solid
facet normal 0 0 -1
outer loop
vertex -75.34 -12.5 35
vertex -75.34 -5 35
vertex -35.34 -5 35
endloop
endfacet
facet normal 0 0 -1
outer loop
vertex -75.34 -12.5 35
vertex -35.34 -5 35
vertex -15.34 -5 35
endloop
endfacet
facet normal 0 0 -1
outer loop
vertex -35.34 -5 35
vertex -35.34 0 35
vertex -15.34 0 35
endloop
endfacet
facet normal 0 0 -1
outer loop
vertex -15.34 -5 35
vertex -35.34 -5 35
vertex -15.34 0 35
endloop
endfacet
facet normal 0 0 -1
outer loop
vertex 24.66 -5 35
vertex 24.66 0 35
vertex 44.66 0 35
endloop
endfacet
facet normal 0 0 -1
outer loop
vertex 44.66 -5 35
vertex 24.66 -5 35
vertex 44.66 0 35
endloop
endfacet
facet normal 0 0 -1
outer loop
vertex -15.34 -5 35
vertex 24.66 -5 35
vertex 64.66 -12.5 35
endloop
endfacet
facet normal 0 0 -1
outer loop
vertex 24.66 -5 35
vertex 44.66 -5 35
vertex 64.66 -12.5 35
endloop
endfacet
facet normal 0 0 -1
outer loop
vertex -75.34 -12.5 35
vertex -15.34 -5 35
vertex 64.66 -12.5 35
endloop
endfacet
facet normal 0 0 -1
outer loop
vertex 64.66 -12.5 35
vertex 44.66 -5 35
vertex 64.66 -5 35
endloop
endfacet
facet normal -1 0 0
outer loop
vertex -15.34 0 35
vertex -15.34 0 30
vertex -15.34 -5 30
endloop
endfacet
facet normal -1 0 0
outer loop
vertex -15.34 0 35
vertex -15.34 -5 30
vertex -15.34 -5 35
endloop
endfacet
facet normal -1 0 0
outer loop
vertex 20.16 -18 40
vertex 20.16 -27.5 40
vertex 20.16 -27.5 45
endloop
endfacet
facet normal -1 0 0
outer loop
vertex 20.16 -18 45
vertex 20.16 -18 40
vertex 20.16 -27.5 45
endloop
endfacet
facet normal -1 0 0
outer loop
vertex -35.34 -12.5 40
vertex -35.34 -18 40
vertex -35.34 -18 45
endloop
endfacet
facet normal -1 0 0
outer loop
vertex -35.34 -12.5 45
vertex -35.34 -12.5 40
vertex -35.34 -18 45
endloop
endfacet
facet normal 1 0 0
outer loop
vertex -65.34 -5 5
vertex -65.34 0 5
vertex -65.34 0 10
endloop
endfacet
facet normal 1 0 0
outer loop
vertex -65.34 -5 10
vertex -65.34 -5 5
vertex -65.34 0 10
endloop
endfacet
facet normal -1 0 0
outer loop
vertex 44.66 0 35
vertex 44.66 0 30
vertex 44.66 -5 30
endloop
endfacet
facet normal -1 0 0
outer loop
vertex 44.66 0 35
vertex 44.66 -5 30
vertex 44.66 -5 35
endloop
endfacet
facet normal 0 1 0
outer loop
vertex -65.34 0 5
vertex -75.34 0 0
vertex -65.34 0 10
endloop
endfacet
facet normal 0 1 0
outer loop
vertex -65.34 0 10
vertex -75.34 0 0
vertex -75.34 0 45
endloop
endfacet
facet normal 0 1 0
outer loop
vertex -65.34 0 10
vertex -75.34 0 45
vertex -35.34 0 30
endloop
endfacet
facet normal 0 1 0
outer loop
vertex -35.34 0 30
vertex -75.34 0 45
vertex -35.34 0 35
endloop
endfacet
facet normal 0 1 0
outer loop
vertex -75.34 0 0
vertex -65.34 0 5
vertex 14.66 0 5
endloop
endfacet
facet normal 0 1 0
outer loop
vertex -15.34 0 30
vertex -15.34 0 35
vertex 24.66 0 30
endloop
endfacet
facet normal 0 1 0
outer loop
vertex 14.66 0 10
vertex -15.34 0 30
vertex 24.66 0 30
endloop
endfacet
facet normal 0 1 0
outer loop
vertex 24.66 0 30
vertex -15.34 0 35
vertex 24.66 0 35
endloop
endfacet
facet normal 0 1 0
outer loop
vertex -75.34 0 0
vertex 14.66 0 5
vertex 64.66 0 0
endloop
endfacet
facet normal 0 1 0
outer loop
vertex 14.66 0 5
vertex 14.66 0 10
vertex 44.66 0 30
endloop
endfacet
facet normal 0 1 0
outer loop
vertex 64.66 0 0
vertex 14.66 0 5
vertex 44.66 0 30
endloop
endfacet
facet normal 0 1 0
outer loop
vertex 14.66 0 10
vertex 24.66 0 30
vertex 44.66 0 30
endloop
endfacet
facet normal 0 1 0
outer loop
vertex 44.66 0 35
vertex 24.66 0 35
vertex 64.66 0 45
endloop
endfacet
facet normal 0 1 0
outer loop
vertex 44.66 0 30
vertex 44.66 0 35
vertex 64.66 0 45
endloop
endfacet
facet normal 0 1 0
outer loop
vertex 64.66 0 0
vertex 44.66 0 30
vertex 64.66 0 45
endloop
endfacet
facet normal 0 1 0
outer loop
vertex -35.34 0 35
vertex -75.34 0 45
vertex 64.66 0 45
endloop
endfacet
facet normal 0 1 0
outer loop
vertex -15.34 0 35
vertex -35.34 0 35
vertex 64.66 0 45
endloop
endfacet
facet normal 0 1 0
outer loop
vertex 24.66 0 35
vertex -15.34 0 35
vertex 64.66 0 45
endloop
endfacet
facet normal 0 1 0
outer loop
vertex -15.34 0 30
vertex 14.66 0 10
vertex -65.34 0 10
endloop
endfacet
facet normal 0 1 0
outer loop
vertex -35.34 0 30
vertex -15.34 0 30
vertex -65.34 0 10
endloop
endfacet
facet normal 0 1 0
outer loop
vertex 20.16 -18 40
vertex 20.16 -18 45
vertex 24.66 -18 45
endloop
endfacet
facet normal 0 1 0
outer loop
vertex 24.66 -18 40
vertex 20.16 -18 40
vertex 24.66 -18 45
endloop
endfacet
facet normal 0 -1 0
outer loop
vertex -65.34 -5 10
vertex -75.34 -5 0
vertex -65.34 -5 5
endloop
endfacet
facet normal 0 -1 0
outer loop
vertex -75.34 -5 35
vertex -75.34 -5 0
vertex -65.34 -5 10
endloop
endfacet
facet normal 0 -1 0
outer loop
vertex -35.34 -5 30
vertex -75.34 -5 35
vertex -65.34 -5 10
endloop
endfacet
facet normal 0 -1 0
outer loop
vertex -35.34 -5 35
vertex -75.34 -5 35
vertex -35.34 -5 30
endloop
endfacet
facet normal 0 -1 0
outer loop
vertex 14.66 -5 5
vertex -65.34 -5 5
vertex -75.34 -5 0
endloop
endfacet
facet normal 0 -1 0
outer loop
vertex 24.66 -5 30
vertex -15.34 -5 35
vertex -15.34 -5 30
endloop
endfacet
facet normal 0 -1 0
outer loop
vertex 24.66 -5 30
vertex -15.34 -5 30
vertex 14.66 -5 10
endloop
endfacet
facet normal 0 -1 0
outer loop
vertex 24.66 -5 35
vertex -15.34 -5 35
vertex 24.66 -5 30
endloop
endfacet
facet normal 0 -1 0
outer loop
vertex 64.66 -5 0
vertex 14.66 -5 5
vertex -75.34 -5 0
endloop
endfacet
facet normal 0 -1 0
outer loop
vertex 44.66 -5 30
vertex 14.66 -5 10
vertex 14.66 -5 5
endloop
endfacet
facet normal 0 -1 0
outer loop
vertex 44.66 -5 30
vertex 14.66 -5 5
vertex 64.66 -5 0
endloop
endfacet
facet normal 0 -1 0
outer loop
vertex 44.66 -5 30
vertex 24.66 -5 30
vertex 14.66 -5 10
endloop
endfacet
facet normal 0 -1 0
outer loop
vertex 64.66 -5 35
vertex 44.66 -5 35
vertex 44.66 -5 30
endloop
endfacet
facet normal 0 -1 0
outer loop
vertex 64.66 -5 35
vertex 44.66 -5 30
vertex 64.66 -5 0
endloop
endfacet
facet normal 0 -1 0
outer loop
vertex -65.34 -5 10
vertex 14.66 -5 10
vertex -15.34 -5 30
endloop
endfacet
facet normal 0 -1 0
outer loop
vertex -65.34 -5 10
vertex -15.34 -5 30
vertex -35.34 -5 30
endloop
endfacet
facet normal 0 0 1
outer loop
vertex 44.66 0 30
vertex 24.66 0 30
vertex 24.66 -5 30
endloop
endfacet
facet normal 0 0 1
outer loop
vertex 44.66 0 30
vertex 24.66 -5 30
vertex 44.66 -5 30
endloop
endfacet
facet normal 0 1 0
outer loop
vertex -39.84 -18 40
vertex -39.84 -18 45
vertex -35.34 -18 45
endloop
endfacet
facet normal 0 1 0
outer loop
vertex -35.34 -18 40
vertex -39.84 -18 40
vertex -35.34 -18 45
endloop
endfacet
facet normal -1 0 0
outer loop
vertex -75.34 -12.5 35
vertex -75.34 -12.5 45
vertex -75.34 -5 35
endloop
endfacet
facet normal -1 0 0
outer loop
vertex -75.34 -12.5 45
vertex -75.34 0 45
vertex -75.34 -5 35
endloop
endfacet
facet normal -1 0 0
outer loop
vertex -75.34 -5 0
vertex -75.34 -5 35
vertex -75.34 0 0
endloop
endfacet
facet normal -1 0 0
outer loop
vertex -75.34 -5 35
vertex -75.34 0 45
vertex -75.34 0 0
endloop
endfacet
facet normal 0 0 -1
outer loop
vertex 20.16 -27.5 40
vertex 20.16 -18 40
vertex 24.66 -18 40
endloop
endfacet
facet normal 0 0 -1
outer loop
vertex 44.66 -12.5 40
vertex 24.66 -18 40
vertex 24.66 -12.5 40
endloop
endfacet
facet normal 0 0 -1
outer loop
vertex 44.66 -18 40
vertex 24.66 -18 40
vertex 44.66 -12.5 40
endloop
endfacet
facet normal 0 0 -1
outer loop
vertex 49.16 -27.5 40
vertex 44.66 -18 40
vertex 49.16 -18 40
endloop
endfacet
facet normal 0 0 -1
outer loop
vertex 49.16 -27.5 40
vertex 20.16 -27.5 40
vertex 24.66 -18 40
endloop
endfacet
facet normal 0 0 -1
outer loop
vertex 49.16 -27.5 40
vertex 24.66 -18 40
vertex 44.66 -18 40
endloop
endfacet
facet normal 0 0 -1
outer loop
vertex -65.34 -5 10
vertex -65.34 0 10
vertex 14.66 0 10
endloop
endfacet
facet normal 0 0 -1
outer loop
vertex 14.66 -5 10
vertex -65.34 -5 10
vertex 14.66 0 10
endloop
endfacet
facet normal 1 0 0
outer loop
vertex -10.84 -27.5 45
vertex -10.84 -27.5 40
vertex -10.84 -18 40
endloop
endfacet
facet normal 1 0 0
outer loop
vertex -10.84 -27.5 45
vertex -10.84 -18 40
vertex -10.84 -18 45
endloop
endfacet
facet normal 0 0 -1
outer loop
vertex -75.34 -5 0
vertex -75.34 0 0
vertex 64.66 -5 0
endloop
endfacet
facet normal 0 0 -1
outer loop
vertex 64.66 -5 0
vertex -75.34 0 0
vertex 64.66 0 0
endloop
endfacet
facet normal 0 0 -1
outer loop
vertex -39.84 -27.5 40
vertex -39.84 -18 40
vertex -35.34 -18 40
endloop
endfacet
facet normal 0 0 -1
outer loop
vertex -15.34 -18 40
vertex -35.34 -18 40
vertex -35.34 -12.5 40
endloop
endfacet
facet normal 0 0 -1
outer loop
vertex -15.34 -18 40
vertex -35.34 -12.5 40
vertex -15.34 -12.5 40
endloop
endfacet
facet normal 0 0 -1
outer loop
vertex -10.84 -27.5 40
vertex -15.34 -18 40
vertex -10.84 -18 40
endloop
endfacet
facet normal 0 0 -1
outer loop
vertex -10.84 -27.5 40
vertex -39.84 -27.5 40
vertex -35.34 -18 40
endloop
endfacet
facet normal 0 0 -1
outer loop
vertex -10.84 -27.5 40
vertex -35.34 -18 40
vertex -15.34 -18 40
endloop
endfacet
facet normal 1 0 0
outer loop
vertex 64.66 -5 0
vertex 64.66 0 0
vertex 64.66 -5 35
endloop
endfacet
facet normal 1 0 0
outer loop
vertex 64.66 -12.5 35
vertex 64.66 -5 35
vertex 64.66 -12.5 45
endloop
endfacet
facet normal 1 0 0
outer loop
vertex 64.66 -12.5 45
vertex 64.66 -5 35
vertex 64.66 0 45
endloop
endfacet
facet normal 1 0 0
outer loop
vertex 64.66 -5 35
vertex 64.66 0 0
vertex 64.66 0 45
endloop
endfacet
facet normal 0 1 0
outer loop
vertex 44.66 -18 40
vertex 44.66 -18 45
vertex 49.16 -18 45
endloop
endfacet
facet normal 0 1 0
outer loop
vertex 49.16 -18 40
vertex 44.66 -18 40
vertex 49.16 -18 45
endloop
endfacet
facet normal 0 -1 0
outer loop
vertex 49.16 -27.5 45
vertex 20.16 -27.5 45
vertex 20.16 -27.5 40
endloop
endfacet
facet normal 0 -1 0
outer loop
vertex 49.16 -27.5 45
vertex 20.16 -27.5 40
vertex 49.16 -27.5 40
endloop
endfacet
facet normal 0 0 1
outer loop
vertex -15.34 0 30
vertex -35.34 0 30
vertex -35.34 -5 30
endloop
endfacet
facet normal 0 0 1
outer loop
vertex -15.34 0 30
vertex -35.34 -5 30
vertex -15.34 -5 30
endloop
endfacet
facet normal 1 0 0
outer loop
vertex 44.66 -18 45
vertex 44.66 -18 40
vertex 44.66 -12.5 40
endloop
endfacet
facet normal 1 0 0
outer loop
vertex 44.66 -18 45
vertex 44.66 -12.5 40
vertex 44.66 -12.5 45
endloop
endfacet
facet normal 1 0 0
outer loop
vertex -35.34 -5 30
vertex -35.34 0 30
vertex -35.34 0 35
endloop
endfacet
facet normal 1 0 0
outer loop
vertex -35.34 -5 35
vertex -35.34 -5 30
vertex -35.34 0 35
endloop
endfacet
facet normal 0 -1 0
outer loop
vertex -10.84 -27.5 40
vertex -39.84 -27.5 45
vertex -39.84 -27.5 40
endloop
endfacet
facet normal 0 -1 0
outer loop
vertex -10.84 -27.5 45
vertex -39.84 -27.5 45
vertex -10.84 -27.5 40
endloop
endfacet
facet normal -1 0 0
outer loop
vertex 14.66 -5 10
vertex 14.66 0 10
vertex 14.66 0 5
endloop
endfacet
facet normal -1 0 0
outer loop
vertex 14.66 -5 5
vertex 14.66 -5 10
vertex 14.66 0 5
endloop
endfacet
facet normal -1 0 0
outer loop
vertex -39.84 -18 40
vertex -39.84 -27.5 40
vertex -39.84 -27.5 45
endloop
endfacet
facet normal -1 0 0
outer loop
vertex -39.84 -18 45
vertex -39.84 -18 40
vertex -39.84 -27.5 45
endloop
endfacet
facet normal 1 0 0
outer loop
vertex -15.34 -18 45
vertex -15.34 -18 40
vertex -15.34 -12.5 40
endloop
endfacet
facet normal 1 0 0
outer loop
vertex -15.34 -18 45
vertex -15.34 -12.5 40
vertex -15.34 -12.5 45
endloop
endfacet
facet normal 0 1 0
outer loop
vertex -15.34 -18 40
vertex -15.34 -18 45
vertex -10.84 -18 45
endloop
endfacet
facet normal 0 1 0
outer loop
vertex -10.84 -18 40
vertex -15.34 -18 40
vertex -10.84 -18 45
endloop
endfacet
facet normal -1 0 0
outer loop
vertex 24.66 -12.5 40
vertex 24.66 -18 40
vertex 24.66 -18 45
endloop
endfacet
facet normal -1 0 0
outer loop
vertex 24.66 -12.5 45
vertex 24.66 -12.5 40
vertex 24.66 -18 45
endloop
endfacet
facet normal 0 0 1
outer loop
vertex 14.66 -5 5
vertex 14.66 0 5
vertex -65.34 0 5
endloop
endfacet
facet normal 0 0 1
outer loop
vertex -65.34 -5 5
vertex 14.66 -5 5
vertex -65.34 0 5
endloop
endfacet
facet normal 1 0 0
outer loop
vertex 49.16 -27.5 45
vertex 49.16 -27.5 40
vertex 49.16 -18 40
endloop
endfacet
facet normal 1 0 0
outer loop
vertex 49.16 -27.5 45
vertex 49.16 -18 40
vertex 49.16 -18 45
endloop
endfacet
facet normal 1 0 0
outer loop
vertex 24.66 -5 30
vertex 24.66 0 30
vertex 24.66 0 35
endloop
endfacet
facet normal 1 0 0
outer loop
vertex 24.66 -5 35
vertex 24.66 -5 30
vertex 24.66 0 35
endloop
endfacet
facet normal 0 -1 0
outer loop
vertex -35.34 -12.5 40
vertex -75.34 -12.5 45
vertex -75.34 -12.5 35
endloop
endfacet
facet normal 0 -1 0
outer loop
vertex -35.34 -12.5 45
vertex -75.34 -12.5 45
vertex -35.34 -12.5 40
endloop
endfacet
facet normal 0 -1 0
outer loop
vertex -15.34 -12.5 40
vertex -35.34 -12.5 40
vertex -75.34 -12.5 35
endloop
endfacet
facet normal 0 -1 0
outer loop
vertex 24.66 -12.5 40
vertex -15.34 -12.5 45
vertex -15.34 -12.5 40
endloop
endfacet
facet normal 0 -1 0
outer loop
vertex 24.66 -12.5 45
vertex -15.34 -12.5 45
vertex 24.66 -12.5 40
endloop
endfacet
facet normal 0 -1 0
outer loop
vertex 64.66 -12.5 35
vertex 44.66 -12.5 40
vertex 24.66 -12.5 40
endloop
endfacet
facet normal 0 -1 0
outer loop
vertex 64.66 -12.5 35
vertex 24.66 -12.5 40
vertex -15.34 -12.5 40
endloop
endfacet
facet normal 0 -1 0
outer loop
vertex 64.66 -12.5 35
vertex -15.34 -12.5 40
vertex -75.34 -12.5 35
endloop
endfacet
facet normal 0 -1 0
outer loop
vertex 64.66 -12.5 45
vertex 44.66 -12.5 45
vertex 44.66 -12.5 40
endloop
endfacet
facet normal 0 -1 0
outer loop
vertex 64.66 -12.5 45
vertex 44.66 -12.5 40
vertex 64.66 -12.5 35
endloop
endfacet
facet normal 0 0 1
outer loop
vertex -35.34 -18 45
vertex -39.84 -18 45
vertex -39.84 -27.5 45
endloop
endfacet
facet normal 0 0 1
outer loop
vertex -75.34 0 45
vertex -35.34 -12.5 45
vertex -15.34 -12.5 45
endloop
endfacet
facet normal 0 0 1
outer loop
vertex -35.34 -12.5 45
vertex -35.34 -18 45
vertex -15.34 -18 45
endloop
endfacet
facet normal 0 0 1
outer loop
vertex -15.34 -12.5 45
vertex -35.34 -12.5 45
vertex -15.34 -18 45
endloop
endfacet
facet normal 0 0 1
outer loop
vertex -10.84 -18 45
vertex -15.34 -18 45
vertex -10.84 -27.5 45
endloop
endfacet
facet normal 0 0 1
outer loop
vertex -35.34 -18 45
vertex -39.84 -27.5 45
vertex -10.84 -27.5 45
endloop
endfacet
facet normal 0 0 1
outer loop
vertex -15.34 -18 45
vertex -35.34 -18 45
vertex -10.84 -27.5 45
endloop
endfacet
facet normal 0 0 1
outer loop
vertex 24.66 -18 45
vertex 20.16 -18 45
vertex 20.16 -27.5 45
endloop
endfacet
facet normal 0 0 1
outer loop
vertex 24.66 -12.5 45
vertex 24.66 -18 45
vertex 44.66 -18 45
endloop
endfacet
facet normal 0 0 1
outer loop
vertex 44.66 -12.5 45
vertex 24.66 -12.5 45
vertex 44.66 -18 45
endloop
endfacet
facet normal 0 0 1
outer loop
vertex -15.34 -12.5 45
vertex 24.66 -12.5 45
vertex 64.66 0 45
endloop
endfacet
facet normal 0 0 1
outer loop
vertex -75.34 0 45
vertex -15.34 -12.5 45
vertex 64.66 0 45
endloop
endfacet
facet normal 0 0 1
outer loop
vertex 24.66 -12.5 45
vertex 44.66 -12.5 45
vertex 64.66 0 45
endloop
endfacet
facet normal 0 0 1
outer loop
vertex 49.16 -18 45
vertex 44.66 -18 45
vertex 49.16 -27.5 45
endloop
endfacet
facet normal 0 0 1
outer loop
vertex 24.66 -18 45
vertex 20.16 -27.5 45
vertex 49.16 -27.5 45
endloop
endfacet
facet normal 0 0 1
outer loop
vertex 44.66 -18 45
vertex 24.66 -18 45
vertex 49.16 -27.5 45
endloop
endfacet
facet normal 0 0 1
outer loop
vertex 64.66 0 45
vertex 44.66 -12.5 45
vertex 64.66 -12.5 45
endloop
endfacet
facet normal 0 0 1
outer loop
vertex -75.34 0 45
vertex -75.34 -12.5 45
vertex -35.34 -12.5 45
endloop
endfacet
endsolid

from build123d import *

# Parameters (mm, degrees)
F0_W     = 20
F0_H     = 5
F1_DEPTH = 5
F3_DEPTH = 27.5
F4_DEPTH = 7.5
F5_W     = 4.5
F5_H     = 5
F6_DEPTH = 9.5
F7_W     = 4.5
F7_H     = 5
F8_DEPTH = 9.5


with BuildPart() as f1:
    # F0 (on Front) → F1 (new body)
    with BuildSketch(Plane.XZ):
        Polygon((-75.340211, 45), (-75.340211, 0), (64.659789, 0), (64.659789, 45), (44.659789, 45), (44.659789, 40), (24.659789, 40), (24.659789, 45), (-15.340211, 45), (-15.340211, 40), (-35.340211, 40), (-35.340211, 45), align=None)
        Polygon((14.659789, 5), (-55.340211, 5), (-65.340211, 5), (-65.340211, 10), (-55.340211, 10), (14.659789, 10), align=None, mode=Mode.SUBTRACT)
        with Locations((-25.340211, 32.5)):
            Rectangle(F0_W, F0_H, mode=Mode.SUBTRACT)
        with Locations((34.659789, 32.5)):
            Rectangle(F0_W, F0_H, mode=Mode.SUBTRACT)
    extrude(amount=F1_DEPTH)

    # F0 (on Front) → F3 (join)
    with BuildSketch(Plane.XZ):
        with Locations((-25.340211, 42.5)):
            Rectangle(F0_W, F0_H)
        with Locations((34.659789, 42.5)):
            Rectangle(F0_W, F0_H)
    extrude(amount=F3_DEPTH)

    # F2 (on face) → F4 (join)
    with BuildSketch(Plane.XZ.offset(5)):
        Polygon((-35.340211, 45), (-75.340211, 45), (-75.340211, 35), (-35.340211, 35), (-15.340211, 35), (24.659789, 35), (44.659789, 35), (64.659789, 35), (64.659789, 45), (44.659789, 45), (44.659789, 40), (24.659789, 40), (24.659789, 45), (-15.340211, 45), (-15.340211, 40), (-35.340211, 40), align=None)
    extrude(amount=F4_DEPTH)

    # F5 (on face) → F6 (join)
    with BuildSketch(Plane.XZ.offset(27.5)):
        with Locations((-37.590211, 42.5)):
            Rectangle(F5_W, F5_H)
        with Locations((-13.090211, 42.5)):
            Rectangle(F5_W, F5_H)
    extrude(amount=-F6_DEPTH)

    # F7 (on face) → F8 (join)
    with BuildSketch(Plane.XZ.offset(27.5)):
        with Locations((22.409789, 42.5)):
            Rectangle(F7_W, F7_H)
        with Locations((46.909789, 42.5)):
            Rectangle(F7_W, F7_H)
    extrude(amount=-F8_DEPTH)


solid = f1.part
